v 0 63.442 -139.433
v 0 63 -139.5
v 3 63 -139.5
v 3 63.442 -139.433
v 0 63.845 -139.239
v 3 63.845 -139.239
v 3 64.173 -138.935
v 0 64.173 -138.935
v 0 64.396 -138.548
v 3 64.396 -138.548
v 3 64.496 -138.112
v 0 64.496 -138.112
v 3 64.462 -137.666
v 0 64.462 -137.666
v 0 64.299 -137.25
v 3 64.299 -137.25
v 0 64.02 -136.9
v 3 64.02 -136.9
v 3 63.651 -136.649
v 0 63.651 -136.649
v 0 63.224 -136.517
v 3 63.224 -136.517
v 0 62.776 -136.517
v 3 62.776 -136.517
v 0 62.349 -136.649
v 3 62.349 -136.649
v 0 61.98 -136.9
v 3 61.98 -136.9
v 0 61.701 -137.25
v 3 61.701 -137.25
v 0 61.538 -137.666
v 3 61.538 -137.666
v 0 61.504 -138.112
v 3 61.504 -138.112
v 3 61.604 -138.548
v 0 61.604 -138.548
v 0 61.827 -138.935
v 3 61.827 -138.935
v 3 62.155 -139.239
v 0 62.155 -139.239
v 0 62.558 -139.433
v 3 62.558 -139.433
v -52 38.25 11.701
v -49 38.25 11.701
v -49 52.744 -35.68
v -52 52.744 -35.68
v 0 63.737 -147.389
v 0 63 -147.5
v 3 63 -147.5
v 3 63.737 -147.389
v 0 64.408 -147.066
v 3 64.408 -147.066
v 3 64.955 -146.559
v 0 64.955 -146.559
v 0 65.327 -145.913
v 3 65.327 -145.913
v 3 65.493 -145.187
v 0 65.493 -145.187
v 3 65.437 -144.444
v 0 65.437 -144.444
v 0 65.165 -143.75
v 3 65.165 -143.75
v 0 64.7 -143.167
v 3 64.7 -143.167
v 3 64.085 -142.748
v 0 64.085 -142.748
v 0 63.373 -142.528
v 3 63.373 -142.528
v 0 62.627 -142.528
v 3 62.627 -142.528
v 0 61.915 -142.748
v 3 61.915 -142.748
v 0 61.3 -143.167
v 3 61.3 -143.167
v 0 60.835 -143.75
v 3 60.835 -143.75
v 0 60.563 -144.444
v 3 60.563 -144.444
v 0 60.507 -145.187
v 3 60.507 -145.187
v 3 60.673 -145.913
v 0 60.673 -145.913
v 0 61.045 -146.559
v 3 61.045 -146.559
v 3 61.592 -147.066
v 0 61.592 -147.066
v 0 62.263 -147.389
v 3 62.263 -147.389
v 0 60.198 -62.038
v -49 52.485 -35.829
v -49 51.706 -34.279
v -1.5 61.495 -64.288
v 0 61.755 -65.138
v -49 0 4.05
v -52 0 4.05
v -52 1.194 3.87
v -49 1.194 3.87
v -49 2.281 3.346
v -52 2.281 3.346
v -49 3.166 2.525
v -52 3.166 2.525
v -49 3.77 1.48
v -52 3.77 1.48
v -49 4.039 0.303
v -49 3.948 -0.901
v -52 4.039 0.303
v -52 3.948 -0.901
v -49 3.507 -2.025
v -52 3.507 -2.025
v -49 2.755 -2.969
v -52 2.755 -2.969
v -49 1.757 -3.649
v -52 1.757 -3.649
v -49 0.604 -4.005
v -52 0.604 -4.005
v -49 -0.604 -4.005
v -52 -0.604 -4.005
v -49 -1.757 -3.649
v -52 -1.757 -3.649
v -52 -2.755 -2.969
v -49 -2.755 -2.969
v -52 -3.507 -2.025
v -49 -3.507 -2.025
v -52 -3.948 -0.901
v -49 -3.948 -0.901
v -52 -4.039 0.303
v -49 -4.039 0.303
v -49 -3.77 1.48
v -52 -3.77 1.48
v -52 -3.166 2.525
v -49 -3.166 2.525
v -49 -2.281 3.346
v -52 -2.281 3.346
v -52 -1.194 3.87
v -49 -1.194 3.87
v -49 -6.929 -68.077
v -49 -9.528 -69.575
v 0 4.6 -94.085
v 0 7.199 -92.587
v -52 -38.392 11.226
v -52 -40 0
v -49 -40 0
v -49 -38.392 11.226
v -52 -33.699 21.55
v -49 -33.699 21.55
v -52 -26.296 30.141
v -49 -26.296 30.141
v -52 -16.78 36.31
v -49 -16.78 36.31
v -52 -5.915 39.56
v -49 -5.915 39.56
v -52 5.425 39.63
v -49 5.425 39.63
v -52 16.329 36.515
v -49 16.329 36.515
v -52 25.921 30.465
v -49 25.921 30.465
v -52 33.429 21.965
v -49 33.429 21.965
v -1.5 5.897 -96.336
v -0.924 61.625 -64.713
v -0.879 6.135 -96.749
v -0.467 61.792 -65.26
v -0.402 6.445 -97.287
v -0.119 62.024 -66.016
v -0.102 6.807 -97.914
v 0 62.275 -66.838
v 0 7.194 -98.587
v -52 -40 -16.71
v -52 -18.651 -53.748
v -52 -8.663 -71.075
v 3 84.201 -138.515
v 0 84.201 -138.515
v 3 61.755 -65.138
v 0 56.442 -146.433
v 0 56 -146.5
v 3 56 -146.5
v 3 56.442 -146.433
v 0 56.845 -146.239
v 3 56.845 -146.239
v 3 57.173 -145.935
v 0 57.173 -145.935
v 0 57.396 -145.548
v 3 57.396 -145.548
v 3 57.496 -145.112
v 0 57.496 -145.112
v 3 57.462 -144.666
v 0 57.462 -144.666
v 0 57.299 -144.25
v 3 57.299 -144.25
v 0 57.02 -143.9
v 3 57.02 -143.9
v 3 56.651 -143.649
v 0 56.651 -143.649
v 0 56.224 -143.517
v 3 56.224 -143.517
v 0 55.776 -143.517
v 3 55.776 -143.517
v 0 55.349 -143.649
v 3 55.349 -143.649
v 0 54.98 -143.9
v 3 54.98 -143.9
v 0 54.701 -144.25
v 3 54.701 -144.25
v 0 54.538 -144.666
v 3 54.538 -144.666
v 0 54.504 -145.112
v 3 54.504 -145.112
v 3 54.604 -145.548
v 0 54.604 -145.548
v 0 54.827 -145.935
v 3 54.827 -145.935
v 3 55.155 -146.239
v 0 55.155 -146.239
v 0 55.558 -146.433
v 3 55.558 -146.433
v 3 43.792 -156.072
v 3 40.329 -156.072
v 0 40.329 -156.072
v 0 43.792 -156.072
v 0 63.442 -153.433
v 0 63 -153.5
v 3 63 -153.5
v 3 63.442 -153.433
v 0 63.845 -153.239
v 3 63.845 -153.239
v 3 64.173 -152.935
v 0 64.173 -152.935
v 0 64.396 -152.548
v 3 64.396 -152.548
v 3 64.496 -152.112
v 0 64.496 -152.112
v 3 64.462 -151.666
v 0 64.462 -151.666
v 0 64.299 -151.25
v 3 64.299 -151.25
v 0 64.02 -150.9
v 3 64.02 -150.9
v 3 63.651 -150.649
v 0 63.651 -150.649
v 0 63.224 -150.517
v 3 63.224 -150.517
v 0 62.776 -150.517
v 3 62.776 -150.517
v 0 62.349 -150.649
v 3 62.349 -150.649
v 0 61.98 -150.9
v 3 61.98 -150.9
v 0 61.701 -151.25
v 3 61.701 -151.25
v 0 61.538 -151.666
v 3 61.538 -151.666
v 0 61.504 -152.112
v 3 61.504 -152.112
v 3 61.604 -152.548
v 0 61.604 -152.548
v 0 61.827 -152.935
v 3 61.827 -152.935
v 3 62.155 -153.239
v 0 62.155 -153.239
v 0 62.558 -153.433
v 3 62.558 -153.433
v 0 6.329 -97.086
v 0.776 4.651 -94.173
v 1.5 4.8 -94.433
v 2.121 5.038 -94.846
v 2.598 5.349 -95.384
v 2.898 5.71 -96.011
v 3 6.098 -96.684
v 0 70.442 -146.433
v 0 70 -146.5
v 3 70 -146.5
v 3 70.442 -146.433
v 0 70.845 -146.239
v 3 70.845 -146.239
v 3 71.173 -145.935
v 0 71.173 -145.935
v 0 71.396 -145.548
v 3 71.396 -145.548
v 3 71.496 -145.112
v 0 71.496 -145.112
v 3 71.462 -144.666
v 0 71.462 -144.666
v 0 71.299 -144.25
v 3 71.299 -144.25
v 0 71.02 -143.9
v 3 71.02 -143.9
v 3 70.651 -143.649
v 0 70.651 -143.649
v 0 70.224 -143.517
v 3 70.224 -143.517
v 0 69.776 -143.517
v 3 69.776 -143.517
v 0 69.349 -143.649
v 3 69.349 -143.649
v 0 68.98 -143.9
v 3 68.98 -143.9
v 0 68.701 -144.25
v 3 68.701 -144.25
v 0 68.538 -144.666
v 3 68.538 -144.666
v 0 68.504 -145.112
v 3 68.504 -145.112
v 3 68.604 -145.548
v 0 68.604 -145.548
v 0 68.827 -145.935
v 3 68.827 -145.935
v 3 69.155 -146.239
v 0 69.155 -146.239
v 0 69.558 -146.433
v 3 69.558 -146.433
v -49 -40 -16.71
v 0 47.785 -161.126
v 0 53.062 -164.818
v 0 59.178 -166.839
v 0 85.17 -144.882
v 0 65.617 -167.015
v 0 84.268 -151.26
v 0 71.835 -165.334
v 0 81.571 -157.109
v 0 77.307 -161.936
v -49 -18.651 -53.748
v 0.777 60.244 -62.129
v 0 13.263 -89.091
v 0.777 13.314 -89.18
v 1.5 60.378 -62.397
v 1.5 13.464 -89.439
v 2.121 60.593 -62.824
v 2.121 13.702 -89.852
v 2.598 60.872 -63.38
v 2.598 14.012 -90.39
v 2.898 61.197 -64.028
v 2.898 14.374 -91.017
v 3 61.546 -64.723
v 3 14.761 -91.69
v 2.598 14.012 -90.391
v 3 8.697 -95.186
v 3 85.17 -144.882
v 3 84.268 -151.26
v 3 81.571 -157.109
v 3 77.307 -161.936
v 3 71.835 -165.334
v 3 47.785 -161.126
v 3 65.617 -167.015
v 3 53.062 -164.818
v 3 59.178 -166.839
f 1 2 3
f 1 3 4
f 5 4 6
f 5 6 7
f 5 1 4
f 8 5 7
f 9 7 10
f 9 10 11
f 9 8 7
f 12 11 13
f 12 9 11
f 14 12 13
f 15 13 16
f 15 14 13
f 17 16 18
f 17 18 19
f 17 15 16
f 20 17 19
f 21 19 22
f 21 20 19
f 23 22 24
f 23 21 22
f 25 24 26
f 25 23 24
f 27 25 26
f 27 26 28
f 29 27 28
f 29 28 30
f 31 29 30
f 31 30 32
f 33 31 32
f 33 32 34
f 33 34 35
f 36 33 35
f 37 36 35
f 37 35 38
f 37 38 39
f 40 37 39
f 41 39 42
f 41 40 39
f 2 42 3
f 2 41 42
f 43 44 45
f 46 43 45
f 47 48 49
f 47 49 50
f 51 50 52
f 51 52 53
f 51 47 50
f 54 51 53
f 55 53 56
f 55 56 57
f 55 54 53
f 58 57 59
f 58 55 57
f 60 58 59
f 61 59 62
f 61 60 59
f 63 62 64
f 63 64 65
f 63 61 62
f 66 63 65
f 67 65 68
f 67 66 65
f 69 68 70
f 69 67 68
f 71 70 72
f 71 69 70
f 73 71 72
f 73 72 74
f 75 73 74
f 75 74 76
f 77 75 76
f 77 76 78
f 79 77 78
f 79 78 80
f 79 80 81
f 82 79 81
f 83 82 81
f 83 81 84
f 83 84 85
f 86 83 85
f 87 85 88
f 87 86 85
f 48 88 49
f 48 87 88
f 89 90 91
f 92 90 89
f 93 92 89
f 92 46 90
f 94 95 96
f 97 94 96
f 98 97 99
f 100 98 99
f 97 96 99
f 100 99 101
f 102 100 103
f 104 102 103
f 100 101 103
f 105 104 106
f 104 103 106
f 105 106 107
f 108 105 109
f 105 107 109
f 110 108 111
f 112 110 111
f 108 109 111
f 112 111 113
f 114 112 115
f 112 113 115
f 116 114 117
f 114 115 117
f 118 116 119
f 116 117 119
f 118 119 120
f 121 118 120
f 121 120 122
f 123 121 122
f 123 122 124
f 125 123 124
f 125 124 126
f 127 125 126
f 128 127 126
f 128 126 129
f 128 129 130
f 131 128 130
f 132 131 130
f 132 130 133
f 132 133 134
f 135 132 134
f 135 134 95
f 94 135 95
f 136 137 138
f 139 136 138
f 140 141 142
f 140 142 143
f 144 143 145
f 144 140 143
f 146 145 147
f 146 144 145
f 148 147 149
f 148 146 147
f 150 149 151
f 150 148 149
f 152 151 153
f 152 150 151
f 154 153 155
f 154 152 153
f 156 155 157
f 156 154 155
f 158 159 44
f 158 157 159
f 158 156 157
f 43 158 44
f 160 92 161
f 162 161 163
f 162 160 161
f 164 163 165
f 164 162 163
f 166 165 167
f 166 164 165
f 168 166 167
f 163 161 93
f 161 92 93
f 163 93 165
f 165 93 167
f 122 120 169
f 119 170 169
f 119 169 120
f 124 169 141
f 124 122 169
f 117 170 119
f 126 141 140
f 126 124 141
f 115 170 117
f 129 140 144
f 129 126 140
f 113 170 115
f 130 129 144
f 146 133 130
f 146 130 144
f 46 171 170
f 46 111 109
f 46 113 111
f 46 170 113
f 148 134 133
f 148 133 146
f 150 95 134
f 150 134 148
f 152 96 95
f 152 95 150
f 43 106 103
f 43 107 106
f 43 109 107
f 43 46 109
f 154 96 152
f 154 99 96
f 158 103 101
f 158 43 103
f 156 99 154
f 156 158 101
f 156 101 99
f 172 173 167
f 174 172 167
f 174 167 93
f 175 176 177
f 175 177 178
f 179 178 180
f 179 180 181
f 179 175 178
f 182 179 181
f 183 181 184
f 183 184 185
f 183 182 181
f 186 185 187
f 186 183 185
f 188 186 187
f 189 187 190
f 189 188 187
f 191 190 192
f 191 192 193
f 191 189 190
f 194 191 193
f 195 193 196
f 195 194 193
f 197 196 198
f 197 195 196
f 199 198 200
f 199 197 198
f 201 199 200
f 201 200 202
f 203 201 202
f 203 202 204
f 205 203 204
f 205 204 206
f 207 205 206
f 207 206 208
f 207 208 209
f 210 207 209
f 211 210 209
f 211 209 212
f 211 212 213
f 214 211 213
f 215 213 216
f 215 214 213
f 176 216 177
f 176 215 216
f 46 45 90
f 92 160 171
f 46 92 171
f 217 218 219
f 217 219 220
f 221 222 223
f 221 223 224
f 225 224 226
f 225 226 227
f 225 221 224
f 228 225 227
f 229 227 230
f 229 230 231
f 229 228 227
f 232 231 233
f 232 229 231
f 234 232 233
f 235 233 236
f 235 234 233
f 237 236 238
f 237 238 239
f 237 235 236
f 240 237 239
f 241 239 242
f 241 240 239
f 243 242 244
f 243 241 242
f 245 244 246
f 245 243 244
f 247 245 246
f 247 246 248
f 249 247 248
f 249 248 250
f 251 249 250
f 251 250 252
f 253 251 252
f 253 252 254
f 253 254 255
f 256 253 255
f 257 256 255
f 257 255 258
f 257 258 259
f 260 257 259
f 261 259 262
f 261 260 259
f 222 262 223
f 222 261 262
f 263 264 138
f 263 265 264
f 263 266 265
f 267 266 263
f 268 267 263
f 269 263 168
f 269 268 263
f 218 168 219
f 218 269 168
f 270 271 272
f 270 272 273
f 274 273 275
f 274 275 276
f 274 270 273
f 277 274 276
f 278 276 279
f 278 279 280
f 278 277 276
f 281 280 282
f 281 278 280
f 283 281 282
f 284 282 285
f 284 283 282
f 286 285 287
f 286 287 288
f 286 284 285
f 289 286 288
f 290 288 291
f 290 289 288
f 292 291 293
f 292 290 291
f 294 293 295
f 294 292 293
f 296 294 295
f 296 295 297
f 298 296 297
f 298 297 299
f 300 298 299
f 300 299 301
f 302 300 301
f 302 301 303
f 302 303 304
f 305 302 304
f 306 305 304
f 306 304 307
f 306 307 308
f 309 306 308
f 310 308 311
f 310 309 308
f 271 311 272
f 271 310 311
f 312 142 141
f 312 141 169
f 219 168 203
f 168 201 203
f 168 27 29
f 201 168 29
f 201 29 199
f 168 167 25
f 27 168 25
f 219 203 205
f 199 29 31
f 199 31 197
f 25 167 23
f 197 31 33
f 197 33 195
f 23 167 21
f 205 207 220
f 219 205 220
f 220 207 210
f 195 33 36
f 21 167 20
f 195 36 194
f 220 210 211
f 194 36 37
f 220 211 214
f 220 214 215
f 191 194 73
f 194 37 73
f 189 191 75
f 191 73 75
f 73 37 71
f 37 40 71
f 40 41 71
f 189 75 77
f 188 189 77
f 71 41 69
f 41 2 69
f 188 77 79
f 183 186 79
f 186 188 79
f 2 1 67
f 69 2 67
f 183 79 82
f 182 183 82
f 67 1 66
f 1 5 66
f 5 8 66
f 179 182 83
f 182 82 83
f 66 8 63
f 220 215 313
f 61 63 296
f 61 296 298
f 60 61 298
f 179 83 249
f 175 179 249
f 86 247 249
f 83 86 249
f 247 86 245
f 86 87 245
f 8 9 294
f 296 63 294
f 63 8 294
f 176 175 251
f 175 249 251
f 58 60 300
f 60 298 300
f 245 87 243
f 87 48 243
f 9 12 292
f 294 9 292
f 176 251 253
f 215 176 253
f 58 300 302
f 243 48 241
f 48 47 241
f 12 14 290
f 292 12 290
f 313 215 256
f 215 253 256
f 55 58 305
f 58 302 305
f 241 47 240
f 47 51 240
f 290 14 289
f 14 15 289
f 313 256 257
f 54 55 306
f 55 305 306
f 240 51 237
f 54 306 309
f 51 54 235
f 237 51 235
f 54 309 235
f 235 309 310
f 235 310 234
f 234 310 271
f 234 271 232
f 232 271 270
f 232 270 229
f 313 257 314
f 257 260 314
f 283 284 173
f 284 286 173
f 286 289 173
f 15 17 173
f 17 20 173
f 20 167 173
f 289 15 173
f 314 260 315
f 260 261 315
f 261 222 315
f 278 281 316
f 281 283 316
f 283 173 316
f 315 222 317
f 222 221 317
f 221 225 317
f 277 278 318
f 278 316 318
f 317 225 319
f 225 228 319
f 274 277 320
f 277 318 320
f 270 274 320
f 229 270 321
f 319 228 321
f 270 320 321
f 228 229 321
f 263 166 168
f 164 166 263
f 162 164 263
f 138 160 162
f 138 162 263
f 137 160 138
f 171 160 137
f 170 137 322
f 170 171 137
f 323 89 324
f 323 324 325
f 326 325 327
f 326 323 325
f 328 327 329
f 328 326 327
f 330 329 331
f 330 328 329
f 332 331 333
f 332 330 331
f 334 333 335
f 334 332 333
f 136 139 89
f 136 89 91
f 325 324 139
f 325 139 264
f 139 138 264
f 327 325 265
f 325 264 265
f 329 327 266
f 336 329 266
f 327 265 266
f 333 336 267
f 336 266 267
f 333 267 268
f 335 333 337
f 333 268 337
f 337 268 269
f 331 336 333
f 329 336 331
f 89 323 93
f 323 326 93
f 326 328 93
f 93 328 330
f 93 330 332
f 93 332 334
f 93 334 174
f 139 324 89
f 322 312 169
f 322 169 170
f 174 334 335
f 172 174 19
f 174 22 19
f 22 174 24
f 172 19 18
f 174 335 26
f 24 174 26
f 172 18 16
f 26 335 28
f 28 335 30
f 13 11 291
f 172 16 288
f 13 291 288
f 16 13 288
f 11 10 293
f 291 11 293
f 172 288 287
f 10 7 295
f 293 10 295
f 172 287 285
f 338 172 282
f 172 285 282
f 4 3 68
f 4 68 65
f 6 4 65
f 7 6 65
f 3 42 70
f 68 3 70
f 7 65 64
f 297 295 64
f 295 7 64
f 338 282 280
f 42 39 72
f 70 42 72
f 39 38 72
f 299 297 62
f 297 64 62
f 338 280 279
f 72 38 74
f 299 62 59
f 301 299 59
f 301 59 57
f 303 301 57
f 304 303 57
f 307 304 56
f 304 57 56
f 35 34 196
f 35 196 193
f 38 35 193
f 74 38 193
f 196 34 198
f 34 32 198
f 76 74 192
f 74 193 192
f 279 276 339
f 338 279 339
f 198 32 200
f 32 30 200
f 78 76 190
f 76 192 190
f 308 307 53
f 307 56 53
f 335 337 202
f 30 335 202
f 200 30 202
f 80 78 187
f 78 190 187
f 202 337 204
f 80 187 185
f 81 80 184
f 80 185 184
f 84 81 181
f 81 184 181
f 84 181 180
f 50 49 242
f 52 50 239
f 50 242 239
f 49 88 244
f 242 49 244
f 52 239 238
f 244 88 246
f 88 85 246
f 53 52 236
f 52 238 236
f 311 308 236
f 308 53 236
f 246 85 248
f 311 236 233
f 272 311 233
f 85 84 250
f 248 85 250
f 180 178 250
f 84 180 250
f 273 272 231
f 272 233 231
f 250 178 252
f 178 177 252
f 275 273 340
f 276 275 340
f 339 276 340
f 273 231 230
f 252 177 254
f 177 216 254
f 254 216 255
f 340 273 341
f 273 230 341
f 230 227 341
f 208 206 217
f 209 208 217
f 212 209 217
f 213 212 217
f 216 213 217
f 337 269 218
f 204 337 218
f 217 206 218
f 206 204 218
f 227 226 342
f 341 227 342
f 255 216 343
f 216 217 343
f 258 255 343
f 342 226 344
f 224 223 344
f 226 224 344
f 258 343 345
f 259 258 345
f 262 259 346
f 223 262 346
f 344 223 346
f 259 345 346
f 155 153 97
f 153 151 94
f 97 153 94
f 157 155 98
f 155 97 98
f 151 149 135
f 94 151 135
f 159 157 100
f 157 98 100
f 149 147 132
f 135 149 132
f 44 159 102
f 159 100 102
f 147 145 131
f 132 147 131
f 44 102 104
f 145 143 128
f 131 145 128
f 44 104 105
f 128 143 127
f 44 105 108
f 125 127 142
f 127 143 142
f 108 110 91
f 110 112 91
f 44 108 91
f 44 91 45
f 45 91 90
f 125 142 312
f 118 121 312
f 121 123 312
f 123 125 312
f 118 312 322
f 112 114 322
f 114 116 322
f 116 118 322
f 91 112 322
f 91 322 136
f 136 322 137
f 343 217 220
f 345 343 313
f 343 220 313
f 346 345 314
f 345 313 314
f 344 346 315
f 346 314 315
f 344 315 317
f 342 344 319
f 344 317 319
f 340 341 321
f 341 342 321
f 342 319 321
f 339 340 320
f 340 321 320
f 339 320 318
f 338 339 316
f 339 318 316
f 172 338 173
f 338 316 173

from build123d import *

# Parameters (mm, degrees)
SKETCH_2_R           = 3
SKETCH_2_R_2         = 1.5
SKETCH_2_R_3         = 2.5
EXTRUDE_1_DEPTH      = 3
EXTRUDE_2_DEPTH      = 196
SKETCH_5_R           = 8
CUT_EXTRUDE_1_DEPTH  = 10
SKETCH_6_R           = 4.05
CUT_EXTRUDE_2_DEPTH  = 10
SKETCH_8_R           = 40
EXTRUDE_3_DEPTH      = 3
EXTRUDE_START        = -61
EXTRUDE_4_DEPTH      = 64
EXTRUDE_5_DEPTH      = 3
EXTRUDE_START_2      = -3
EXTRUDE_14_DEPTH     = 3
EXTRUDE_15_DEPTH     = 3
SKETCH_16_R          = 40
EXTRUDE_16_DEPTH     = 3
CUT_EXTRUDE_START    = -20
CUT_EXTRUDE_5_DEPTH  = 20
CUT_EXTRUDE_6_DEPTH  = 20
CUT_EXTRUDE_7_DEPTH  = 3
FILLET_3_R           = 3
FILLET_4_R           = 3
FILLET_5_R           = 3
FILLET_6_R           = 3
SKETCH_22_R          = 7.75
CUT_EXTRUDE_8_DEPTH  = 10
SKETCH_23_R          = 4.05
CUT_EXTRUDE_9_DEPTH  = 10
CUT_EXTRUDE_10_DEPTH = 10
SKETCH_25_W          = 514.702896461
SKETCH_25_H          = 285.568662858
CUT_EXTRUDE_11_DEPTH = 80


# Some blends are built 0.0001 mm under size
with BuildPart() as part:
    # 草图2 → 凸台-拉伸1 (new body)
    with BuildSketch(Plane(origin=(0, 0, 0), x_dir=(0, 0, -1), z_dir=(1, 0, 0))):
        with BuildLine():
            Line((138.514809283, 84.200667909), (-11.70063651, 38.25042621))
            ThreePointArc((-11.70063651, 38.25042621), (-39.560188627, -5.915359313), (0, -40))
            Line((0, -40), (16.710190716, -40))
            Line((16.710190716, -40), (156.071648789, 40.329376559))
            Line((156.071648789, 40.329376559), (156.071648789, 43.792069046))
            ThreePointArc((156.071648789, 43.792069046), (165.334026038, 71.834783727), (138.514809283, 84.200667909))
        make_face()
        Circle(SKETCH_2_R, mode=Mode.SUBTRACT)
        with Locations((145, 70)):
            Circle(SKETCH_2_R_2, mode=Mode.SUBTRACT)
        with Locations((138, 63)):
            Circle(SKETCH_2_R_2, mode=Mode.SUBTRACT)
        with Locations((145, 56)):
            Circle(SKETCH_2_R_2, mode=Mode.SUBTRACT)
        with Locations((145, 63)):
            Circle(SKETCH_2_R_3, mode=Mode.SUBTRACT)
        with Locations((152, 63)):
            Circle(SKETCH_2_R_2, mode=Mode.SUBTRACT)
    extrude_1 = extrude(amount=EXTRUDE_1_DEPTH)

    # 草图4 → 凸台-拉伸2 (add)
    with BuildSketch(Plane(origin=(3, 0, 0), x_dir=(0, 0, -1), z_dir=(1, 0, 0))):
        with BuildLine():
            Line((0, -40), (16.710190716, -40))
            Line((16.710190716, -40), (156.071648789, 40.329376559))
            Line((156.071648789, 40.329376559), (156.071648789, 43.792069046))
            Line((156.071648789, 43.792069046), (19.975563357, -34.655113166))
            ThreePointArc((19.975563357, -34.655113166), (10.339136167, -38.640681455), (0, -40))
        make_face()
    extrude(amount=EXTRUDE_2_DEPTH)

    # 镜向2: 凸台-拉伸1 across plane
    add(extrude_1.mirror(Plane(origin=(101, 0, 0), x_dir=(0, 0, 1), z_dir=(1, 0, 0))))

    # 草图5 → 切除-拉伸1 (cut)
    with BuildSketch(Plane(origin=(202, 0, 0), x_dir=(0, 0, -1), z_dir=(1, 0, 0))):
        Circle(SKETCH_5_R)
    extrude(amount=-CUT_EXTRUDE_1_DEPTH, mode=Mode.SUBTRACT)

    # 草图6 → 切除-拉伸2 (cut)
    with BuildSketch(Plane.ZY):
        Circle(SKETCH_6_R)
    extrude(amount=-CUT_EXTRUDE_2_DEPTH, mode=Mode.SUBTRACT)

    # 草图9 → 凸台-拉伸4 (add)
    with BuildSketch(Plane(origin=(251, 0, 0), x_dir=(0, 0, -1), z_dir=(1, 0, 0)).offset(EXTRUDE_START)):
        with BuildLine():
            Line((0, -40), (16.710190716, -40))
            Line((16.710190716, -40), (53.747942483, -18.651059269))
            Line((53.747942483, -18.651059269), (52.249775231, -16.051925781))
            Line((52.249775231, -16.051925781), (19.975563357, -34.655113166))
            ThreePointArc((19.975563357, -34.655113166), (10.339136167, -38.640681455), (0, -40))
        make_face()
    extrude_4 = extrude(amount=EXTRUDE_4_DEPTH)

    # 草图10 → 凸台-拉伸5 (add)
    with BuildSketch(Plane(origin=(0, -37.254246654, -21.473730609), x_dir=(1, 0, 0), z_dir=(0, -0.8663778291595938, -0.49938908392225567))):
        Polygon((254, -37.251890328), (254, -57.251890328), (202, -87.274104325), (202, -37.251890328), align=None)
    extrude_5 = extrude(amount=-EXTRUDE_5_DEPTH)



with BuildPart() as body_2:
    # 草图8 → 凸台-拉伸3 (new body)
    with BuildSketch(Plane(origin=(251, 0, 0), x_dir=(0, 0, -1), z_dir=(1, 0, 0))):
        Circle(SKETCH_8_R)
    extrude(amount=EXTRUDE_3_DEPTH)


with BuildPart() as part_1:
    add(part.part)

    add(body_2.part)  # 凸台-拉伸14 merges body 2
    # 草图14 → 凸台-拉伸14 (add)
    with BuildSketch(Plane(origin=(254, 0, 0), x_dir=(0, 0, -1), z_dir=(1, 0, 0)).offset(EXTRUDE_START_2)):
        with BuildLine():
            Line((-11.70063651, 38.25042621), (35.679778873, 52.743886101))
            Line((35.679778873, 52.743886101), (69.577331814, -6.064144103))
            Line((69.577331814, -6.064144103), (19.975563357, -34.655113166))
            ThreePointArc((19.975563357, -34.655113166), (36.686823541, 15.939792297), (-11.70063651, 38.25042621))
        make_face()
    extrude_14 = extrude(amount=EXTRUDE_14_DEPTH)

    # 草图15 → 凸台-拉伸15 (add)
    with BuildSketch(Plane(origin=(88.290795719, 76.368648195, -132.490087928), x_dir=(-0.8660254037844362, 0.24969454196113003, -0.4331889145798008), z_dir=(0.5000000000000044, 0.4324836330493111, -0.7503052093278204))):
        Polygon((-191.344507397, -43), (-191.344507397, 27.878041456), (-131.300079402, 20.97393325), (-131.300079402, -43), align=None)
    extrude_15 = extrude(amount=-EXTRUDE_15_DEPTH)

    # 镜向8: 凸台-拉伸15 across plane
    add(extrude_15.mirror(Plane(origin=(101, 0, 0), x_dir=(0, 0, 1), z_dir=(1, 0, 0))))

    # 镜向10: 凸台-拉伸5 across plane
    add(extrude_5.mirror(Plane(origin=(101, 0, 0), x_dir=(0, 0, 1), z_dir=(1, 0, 0))))

    # 镜向11: 凸台-拉伸4 across plane
    add(extrude_4.mirror(Plane(origin=(101, 0, 0), x_dir=(0, 0, 1), z_dir=(1, 0, 0))))

    # 镜向12: 凸台-拉伸14 across plane
    add(extrude_14.mirror(Plane(origin=(101, 0, 0), x_dir=(0, 0, 1), z_dir=(1, 0, 0))))

    # 草图16 → 凸台-拉伸16 (add)
    with BuildSketch(Plane.ZY.offset(52)):
        Circle(SKETCH_16_R)
    extrude(amount=-EXTRUDE_16_DEPTH)

    # 草图17 → 切除-拉伸5 (cut)
    with BuildSketch(Plane(origin=(202, 0, 0), x_dir=(0, 0, -1), z_dir=(1, 0, 0)).offset(CUT_EXTRUDE_START)):
        with BuildLine():
            Line((-11.120326036, 38.423148607), (61.739147636, 60.715331959))
            Line((61.739147636, 60.715331959), (65.138195736, 61.755085767))
            Line((65.138195736, 61.755085767), (62.037518083, 60.197696416))
            Line((62.037518083, 60.197696416), (92.586691567, 7.198687311))
            Line((92.586691567, 7.198687311), (19.975563357, -34.655113166))
            ThreePointArc((19.975563357, -34.655113166), (-36.806411031, -15.66167638), (-11.120326036, 38.423148607))
        make_face()
    extrude(amount=CUT_EXTRUDE_5_DEPTH, mode=Mode.SUBTRACT)


with BuildPart() as cut_extrude_5_piece_1:
    # of the separate pieces the step leaves, piece 1, a body of its own (cut_extrude_5_pieces)
    add(part_1.part.solids().sort_by_distance((0, 43.792069046, -156.071648789))[0])

    # 草图21 → 切除-拉伸7 (cut)
    with BuildSketch(Plane(origin=(3, 0, 0), x_dir=(0, 0, -1), z_dir=(1, 0, 0))):
        with BuildLine():
            Line((92.586691567, 7.198687311), (62.037518083, 60.197696416))
            Line((62.037518083, 60.197696416), (65.138195736, 61.755085767))
            Line((65.138195736, 61.755085767), (61.739147636, 60.715331959))
            Line((61.739147636, 60.715331959), (-11.70063651, 38.25042621))
            ThreePointArc((-11.70063651, 38.25042621), (-36.686823541, -15.939792297), (19.975563357, -34.655113166))
            Line((19.975563357, -34.655113166), (92.586691567, 7.198687311))
        make_face()
    extrude(amount=-CUT_EXTRUDE_7_DEPTH, mode=Mode.SUBTRACT)

    # 圆角3
    fillet_3_edges = [cut_extrude_5_piece_1.edges().sort_by_distance(p)[0] for p in [
        (3, 33.698191863, -77.312104825),
    ]]
    fillet(fillet_3_edges, radius=FILLET_3_R - 0.0001)  # a hair under: the kernel refuses the full size

    # 圆角4
    fillet_4_edges = [cut_extrude_5_piece_1.edges().sort_by_distance(p)[0] for p in [
        (199, 33.698191863, -77.312104825),
    ]]
    fillet(fillet_4_edges, radius=FILLET_4_R - 0.0001)  # a hair under: the kernel refuses the full size

    # 圆角5
    # the kernel refuses this fillet: 3 mm, written as the material it adds along each edge
    with BuildSketch(Plane(origin=(202, 65.506611814, -62.97577757), x_dir=(0, 0.49938908392225534, -0.8663778291595939), z_dir=(0, -0.866377829159594, -0.4993890839222554))) as fillet_5_piece_1_section:
        with BuildLine():
            CenterArc((FILLET_5_R * 0.57735026919, FILLET_5_R), FILLET_5_R, 210, 60)
            Line((-FILLET_5_R * 0.288675134595, FILLET_5_R * 0.5), (0, 0))
            Line((0, 0), (FILLET_5_R * 0.57735026919, 0))
        make_face()
    fillet_5_piece_1 = extrude(amount=68.304060269, mode=Mode.PRIVATE)
    fillet_5_piece_1 = split(fillet_5_piece_1, bisect_by=Plane(origin=(202.325553984, 63.906694987, -72.171998522), z_dir=(0, -0.9562606552534866, -0.2925159127537726)), keep=Keep.TOP, mode=Mode.PRIVATE)
    fillet_5_piece_1 = split(fillet_5_piece_1, bisect_by=Plane(origin=(199.177617764, 62.412552566, -67.072312804), z_dir=(0.09892666816624712, -0.8892295154916122, -0.44663674625368427)), keep=Keep.TOP, mode=Mode.PRIVATE)
    add(fillet_5_piece_1)

    # 圆角6
    # the kernel refuses this fillet: 3 mm, written as the material it adds along each edge
    with BuildSketch(Plane(origin=(0, 6.329488355, -97.086079656), x_dir=(2.017234182721707e-14, 0.49938908392225534, -0.8663778291595939), z_dir=(0, 0.8663778291595939, 0.4993890839222554))) as fillet_6_piece_1_section:
        with BuildLine():
            CenterArc((FILLET_6_R * 0.57735026919, FILLET_6_R), FILLET_6_R, 210, 60)
            Line((-FILLET_6_R * 0.288675134595, FILLET_6_R * 0.5), (0, 0))
            Line((0, 0), (FILLET_6_R * 0.57735026919, 0))
        make_face()
    fillet_6_piece_1 = extrude(amount=68.304060269, mode=Mode.PRIVATE)
    fillet_6_piece_1 = split(fillet_6_piece_1, bisect_by=Plane(origin=(-0.325553984, 63.906694987, -72.171998522), z_dir=(0, -0.9562606552534866, -0.2925159127537726)), keep=Keep.TOP, mode=Mode.PRIVATE)
    fillet_6_piece_1 = split(fillet_6_piece_1, bisect_by=Plane(origin=(2.822382236, 62.412552566, -67.072312804), z_dir=(-0.09892666816624712, -0.8892295154916122, -0.44663674625368427)), keep=Keep.TOP, mode=Mode.PRIVATE)
    add(fillet_6_piece_1)

    # 草图22 → 切除-拉伸8 (cut)
    with BuildSketch(Plane(origin=(254, 0, 0), x_dir=(0, 0, -1), z_dir=(1, 0, 0))):
        Circle(SKETCH_22_R)
    extrude(amount=-CUT_EXTRUDE_8_DEPTH, mode=Mode.SUBTRACT)

    # 草图23 → 切除-拉伸9 (cut)
    with BuildSketch(Plane.ZY.offset(52)):
        Circle(SKETCH_23_R)
    extrude(amount=-CUT_EXTRUDE_9_DEPTH, mode=Mode.SUBTRACT)

    # 草图24 → 切除-拉伸10 (cut)
    with BuildSketch(Plane(origin=(0, -37.254246654, -21.473730609), x_dir=(1, 0, 0), z_dir=(0, -0.8663778291595938, -0.49938908392225567))):
        with BuildLine():
            Line((-49, 40), (-49, -55.51983952))
            Line((-49, -55.51983952), (0, -83.81000271))
            ThreePointArc((0, -83.81000271), (2.121320344, -84.688682367), (3, -86.81000271))
            Line((3, -86.81000271), (3, -87.274104325))
            Line((3, -87.274104325), (3, -179.256683584))
            Line((3, -179.256683584), (199, -179.256683584))
            Line((199, -179.256683584), (199, -87.274104325))
            Line((199, -87.274104325), (199, -86.81000271))
            ThreePointArc((199, -86.81000271), (199.878679656, -84.688682367), (202, -83.81000271))
            Line((202, -83.81000271), (251, -55.51983952))
            Line((251, -55.51983952), (251, 40))
            Line((251, 40), (-49, 40))
        make_face()
    extrude(amount=-CUT_EXTRUDE_10_DEPTH, mode=Mode.SUBTRACT)


with BuildPart() as cut_extrude_5_piece_2:
    # of the separate pieces the step leaves, piece 2, a body of its own (cut_extrude_5_pieces)
    add(part_1.part.solids().sort_by_distance((202, 60.715331959, -61.739147636))[0])

    # 草图18 → 切除-拉伸6 (cut)
    with BuildSketch(Plane(origin=(0, 38.25042621, 11.70063651), x_dir=(1, 0, 0), z_dir=(0, 0.9562606552534866, 0.2925159127537726))):
        Polygon((199, 76.798918519), (202, 76.932821805), (202, 0), (199, 0), align=None)
    extrude(amount=-CUT_EXTRUDE_6_DEPTH, mode=Mode.SUBTRACT)


with BuildPart() as cut_extrude_10_piece_1:
    # of the separate pieces the step leaves, piece 1, a body of its own (cut_extrude_10_pieces)
    add(cut_extrude_5_piece_1.part.solids().sort_by_distance((-1.5, 5.897004722, -96.335774447))[0])


with BuildPart() as cut_extrude_10_piece_2:
    # of the separate pieces the step leaves, piece 2, a body of its own (cut_extrude_10_pieces)
    add(cut_extrude_5_piece_1.part.solids().sort_by_distance((199, 6.097721075, -96.683992306))[0])

    # 草图25 → 切除-拉伸11 (cut)
    with BuildSketch(Plane(origin=(254, 0, 0), x_dir=(0, 0, -1), z_dir=(1, 0, 0))):
        with Locations((-76.2896691, 93.84361465)):
            Rectangle(SKETCH_25_W, SKETCH_25_H)
    extrude(amount=-CUT_EXTRUDE_11_DEPTH, mode=Mode.SUBTRACT)


solid = cut_extrude_10_piece_1.part
